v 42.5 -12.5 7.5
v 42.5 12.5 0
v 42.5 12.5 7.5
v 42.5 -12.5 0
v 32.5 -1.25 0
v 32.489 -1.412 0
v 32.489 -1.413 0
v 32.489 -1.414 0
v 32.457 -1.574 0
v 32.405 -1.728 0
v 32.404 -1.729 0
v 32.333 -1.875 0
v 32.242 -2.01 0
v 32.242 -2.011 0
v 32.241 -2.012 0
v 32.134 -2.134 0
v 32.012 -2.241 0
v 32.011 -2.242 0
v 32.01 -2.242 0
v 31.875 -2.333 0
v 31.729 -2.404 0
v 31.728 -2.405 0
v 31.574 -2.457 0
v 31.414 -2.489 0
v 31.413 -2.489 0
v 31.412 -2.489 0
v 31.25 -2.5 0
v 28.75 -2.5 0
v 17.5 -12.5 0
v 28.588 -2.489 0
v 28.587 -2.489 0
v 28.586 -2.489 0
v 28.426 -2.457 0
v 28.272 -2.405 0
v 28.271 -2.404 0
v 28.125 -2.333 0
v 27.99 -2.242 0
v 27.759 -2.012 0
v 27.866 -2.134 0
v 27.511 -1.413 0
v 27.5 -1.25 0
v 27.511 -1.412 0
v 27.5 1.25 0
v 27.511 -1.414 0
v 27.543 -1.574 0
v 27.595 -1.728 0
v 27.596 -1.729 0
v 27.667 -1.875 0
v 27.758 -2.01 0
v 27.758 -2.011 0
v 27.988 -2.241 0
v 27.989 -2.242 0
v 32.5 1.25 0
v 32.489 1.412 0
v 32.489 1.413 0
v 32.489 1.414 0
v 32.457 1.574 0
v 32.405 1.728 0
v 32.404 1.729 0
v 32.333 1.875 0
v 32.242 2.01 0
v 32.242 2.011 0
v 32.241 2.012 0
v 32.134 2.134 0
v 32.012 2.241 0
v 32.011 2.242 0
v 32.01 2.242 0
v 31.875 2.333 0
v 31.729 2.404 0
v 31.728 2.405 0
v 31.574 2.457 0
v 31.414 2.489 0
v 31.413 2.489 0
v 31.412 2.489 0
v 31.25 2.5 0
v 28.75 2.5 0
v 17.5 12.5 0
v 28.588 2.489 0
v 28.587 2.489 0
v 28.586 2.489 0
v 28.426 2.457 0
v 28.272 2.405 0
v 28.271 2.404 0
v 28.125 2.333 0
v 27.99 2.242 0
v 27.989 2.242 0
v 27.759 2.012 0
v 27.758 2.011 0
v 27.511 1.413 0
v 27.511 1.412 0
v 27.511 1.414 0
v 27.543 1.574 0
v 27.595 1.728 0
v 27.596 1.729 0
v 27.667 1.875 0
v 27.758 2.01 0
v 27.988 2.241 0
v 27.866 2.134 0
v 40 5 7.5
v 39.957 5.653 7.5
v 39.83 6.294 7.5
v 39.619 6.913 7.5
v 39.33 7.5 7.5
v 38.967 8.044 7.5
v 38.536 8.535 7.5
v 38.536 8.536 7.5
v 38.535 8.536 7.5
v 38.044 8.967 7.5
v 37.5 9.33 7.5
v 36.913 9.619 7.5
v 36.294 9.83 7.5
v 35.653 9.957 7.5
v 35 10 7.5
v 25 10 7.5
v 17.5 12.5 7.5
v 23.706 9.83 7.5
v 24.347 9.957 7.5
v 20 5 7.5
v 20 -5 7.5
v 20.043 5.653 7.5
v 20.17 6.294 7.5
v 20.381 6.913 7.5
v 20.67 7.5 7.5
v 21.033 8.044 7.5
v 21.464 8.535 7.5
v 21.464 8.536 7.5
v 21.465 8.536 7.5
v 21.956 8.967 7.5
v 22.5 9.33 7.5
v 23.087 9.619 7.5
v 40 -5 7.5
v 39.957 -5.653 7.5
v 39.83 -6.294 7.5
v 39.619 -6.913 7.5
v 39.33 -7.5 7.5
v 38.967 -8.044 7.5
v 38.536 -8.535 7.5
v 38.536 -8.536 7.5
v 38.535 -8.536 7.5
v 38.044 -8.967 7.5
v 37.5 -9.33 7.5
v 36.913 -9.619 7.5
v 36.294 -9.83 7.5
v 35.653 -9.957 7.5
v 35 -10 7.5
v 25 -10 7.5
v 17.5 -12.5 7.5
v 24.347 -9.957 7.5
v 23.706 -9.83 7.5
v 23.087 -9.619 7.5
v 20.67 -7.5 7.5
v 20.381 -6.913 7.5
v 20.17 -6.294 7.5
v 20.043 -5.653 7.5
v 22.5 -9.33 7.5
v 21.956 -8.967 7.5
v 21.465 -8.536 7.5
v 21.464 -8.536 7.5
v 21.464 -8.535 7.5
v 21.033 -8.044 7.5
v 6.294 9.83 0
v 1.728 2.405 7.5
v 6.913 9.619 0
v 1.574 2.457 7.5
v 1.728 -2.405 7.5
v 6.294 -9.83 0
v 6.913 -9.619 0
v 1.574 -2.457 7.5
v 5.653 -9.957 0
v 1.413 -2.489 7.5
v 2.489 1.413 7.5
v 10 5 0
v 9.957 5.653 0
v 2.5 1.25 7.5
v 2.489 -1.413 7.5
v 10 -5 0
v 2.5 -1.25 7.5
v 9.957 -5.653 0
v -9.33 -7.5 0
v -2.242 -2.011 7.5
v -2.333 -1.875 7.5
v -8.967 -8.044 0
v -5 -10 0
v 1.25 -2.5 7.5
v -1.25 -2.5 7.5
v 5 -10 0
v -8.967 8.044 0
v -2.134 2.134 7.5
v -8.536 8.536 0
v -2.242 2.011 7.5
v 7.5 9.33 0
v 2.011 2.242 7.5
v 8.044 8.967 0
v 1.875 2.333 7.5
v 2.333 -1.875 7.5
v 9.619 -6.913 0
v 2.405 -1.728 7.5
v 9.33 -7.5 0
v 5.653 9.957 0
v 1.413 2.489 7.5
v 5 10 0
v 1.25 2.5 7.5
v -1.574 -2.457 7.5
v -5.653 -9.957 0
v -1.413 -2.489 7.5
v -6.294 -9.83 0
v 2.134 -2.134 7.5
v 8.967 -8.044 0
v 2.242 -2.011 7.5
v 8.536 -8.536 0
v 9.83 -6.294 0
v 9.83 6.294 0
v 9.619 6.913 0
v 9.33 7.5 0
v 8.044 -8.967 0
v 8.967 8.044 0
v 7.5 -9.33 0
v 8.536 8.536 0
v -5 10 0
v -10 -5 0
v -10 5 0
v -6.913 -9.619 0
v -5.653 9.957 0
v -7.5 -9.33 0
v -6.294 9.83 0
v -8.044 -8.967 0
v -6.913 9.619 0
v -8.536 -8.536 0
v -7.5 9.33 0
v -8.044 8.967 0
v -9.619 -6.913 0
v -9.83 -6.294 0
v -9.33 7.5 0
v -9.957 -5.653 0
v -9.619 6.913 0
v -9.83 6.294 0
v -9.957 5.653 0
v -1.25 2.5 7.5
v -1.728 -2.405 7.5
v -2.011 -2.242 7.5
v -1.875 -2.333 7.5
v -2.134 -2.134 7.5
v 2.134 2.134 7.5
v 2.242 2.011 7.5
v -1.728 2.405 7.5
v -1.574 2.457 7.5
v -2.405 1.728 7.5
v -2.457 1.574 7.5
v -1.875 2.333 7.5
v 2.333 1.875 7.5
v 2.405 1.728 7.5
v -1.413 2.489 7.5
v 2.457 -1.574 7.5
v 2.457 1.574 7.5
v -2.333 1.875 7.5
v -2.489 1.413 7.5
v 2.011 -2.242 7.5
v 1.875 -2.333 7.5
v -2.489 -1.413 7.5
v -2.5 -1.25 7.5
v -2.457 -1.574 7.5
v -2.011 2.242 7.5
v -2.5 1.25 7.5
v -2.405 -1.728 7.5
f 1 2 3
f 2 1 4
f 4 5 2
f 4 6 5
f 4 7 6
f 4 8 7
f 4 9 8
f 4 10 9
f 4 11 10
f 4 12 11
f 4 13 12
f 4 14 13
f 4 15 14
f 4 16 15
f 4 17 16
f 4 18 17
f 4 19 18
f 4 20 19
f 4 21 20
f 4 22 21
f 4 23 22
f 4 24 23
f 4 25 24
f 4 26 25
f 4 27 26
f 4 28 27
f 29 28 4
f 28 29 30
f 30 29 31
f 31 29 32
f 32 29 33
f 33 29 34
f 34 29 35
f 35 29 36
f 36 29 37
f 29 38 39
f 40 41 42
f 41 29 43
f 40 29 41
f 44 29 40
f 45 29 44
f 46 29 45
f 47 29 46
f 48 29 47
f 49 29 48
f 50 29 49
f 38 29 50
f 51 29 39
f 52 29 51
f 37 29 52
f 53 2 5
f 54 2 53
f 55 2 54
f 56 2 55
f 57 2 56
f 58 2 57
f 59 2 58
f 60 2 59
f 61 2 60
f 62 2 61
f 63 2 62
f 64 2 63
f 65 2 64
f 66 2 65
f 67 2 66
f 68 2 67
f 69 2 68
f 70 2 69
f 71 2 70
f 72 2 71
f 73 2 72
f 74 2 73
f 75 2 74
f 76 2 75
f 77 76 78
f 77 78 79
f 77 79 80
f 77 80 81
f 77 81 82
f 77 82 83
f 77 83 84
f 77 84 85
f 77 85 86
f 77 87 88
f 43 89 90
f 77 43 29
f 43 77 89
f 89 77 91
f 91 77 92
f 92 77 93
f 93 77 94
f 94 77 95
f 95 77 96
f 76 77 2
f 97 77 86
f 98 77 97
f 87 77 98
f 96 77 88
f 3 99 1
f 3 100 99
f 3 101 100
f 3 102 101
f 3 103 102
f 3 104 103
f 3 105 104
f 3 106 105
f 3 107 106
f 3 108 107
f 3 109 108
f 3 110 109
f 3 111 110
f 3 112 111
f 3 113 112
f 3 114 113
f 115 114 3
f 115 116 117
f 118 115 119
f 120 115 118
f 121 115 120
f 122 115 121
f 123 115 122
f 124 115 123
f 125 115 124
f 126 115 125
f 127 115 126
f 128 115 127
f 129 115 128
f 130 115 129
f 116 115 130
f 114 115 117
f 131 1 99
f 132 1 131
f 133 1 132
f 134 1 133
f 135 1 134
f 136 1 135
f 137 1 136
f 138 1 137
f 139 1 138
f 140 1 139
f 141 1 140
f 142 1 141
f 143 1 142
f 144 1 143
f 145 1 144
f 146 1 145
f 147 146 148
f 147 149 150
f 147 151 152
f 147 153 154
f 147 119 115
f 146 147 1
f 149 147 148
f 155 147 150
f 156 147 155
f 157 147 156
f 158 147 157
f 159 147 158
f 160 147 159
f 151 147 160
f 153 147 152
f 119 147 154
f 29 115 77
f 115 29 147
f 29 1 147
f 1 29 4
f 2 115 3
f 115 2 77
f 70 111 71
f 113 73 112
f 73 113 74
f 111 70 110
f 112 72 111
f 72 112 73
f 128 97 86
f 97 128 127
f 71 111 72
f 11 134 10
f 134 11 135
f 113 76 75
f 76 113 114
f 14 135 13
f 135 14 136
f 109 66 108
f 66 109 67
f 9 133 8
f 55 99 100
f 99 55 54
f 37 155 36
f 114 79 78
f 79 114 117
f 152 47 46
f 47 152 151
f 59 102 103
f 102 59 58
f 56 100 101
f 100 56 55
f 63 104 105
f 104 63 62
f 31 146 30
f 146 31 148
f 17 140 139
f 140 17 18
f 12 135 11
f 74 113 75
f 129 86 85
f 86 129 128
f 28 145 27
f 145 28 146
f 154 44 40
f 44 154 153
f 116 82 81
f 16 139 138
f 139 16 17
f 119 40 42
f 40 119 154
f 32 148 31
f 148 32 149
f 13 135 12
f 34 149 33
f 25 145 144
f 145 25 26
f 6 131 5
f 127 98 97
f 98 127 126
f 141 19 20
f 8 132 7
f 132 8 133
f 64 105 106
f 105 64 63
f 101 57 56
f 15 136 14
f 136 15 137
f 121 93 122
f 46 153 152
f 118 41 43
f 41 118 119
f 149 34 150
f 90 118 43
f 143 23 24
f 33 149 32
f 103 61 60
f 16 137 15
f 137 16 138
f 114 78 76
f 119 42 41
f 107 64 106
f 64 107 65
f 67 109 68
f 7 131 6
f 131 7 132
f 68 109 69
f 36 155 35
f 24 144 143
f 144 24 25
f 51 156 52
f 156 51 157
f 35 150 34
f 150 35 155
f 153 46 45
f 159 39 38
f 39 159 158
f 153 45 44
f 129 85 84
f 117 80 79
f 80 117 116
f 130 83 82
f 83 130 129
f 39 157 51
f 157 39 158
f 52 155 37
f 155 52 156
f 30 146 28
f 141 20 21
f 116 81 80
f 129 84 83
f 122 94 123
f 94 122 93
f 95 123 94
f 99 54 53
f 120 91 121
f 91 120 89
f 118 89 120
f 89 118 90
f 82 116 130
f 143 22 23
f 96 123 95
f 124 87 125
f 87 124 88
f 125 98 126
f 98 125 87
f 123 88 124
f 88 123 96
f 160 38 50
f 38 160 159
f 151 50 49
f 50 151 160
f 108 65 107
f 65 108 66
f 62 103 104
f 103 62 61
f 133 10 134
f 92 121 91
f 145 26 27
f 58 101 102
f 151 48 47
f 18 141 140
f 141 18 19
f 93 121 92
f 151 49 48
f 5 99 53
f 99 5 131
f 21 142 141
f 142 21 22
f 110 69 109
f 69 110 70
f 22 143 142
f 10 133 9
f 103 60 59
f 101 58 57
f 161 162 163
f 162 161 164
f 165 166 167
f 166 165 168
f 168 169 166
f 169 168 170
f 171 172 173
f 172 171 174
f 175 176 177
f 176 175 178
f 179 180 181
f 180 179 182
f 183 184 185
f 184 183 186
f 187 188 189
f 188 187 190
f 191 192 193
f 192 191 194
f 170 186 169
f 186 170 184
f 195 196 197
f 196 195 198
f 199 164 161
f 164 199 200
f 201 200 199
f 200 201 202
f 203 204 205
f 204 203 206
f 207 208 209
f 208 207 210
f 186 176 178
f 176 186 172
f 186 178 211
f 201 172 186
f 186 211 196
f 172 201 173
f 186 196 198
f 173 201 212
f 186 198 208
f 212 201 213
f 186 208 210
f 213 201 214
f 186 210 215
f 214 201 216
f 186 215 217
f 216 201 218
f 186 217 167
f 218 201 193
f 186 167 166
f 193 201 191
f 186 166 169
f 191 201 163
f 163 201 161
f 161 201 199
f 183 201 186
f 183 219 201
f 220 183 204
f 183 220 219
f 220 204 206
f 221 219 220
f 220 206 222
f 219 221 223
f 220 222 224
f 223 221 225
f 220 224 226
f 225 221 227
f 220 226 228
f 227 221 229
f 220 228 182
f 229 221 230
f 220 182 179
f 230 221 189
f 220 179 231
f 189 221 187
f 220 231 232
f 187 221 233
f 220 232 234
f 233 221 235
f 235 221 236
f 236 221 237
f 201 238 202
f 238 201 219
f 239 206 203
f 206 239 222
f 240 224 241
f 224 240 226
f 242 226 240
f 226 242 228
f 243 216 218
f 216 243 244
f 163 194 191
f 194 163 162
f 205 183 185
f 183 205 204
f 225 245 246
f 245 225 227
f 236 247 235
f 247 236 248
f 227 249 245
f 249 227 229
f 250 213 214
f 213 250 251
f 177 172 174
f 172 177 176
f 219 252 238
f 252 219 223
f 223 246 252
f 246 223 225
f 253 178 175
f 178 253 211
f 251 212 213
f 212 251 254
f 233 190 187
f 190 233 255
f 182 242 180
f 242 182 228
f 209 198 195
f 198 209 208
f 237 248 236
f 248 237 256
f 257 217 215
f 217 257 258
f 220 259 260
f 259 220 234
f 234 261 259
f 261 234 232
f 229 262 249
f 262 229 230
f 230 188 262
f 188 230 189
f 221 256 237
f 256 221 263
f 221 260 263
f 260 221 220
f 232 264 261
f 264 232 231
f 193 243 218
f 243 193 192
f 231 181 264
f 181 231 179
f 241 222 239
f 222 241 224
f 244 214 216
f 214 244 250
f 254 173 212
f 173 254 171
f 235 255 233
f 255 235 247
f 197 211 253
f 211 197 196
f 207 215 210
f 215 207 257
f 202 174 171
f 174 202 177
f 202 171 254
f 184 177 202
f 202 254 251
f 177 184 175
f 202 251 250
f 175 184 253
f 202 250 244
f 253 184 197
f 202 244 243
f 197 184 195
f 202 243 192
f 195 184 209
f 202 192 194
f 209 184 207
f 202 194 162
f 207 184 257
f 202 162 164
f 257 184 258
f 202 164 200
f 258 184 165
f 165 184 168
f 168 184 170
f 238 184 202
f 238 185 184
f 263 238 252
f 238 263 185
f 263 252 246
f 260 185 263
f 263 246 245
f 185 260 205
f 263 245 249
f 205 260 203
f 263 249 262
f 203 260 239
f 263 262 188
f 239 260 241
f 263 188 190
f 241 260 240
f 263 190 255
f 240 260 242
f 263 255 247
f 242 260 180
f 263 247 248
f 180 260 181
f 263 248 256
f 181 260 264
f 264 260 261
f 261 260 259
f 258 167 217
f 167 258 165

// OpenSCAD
ep=0.01;//epsilon

$fn=48;


module round_square(w,r){
	offset(r)square(w-r-r,center=true);
}
module rounded_frustrum(wb,wt,r,h,ep){
	grad = (wt - wb) / h;
	epg = ep * grad;
	translate([0,0,-ep])linear_extrude(h+ep+ep, scale=(wt + epg) /(wb - epg))scale((wb - epg) / wb)round_square(wb,r);
}
module calib_cone(){
	rounded_frustrum(20,5,5,7.5,0);
}
module calib_block(){
	difference(){
		translate([-12.5,-12.5])cube([25,25,7.5]);
		rounded_frustrum(20,5,5,7.5,ep);
	}
}

calib_cone();
translate([0,0,7.5])rotate([180,0,0])translate([30,0])calib_block();
